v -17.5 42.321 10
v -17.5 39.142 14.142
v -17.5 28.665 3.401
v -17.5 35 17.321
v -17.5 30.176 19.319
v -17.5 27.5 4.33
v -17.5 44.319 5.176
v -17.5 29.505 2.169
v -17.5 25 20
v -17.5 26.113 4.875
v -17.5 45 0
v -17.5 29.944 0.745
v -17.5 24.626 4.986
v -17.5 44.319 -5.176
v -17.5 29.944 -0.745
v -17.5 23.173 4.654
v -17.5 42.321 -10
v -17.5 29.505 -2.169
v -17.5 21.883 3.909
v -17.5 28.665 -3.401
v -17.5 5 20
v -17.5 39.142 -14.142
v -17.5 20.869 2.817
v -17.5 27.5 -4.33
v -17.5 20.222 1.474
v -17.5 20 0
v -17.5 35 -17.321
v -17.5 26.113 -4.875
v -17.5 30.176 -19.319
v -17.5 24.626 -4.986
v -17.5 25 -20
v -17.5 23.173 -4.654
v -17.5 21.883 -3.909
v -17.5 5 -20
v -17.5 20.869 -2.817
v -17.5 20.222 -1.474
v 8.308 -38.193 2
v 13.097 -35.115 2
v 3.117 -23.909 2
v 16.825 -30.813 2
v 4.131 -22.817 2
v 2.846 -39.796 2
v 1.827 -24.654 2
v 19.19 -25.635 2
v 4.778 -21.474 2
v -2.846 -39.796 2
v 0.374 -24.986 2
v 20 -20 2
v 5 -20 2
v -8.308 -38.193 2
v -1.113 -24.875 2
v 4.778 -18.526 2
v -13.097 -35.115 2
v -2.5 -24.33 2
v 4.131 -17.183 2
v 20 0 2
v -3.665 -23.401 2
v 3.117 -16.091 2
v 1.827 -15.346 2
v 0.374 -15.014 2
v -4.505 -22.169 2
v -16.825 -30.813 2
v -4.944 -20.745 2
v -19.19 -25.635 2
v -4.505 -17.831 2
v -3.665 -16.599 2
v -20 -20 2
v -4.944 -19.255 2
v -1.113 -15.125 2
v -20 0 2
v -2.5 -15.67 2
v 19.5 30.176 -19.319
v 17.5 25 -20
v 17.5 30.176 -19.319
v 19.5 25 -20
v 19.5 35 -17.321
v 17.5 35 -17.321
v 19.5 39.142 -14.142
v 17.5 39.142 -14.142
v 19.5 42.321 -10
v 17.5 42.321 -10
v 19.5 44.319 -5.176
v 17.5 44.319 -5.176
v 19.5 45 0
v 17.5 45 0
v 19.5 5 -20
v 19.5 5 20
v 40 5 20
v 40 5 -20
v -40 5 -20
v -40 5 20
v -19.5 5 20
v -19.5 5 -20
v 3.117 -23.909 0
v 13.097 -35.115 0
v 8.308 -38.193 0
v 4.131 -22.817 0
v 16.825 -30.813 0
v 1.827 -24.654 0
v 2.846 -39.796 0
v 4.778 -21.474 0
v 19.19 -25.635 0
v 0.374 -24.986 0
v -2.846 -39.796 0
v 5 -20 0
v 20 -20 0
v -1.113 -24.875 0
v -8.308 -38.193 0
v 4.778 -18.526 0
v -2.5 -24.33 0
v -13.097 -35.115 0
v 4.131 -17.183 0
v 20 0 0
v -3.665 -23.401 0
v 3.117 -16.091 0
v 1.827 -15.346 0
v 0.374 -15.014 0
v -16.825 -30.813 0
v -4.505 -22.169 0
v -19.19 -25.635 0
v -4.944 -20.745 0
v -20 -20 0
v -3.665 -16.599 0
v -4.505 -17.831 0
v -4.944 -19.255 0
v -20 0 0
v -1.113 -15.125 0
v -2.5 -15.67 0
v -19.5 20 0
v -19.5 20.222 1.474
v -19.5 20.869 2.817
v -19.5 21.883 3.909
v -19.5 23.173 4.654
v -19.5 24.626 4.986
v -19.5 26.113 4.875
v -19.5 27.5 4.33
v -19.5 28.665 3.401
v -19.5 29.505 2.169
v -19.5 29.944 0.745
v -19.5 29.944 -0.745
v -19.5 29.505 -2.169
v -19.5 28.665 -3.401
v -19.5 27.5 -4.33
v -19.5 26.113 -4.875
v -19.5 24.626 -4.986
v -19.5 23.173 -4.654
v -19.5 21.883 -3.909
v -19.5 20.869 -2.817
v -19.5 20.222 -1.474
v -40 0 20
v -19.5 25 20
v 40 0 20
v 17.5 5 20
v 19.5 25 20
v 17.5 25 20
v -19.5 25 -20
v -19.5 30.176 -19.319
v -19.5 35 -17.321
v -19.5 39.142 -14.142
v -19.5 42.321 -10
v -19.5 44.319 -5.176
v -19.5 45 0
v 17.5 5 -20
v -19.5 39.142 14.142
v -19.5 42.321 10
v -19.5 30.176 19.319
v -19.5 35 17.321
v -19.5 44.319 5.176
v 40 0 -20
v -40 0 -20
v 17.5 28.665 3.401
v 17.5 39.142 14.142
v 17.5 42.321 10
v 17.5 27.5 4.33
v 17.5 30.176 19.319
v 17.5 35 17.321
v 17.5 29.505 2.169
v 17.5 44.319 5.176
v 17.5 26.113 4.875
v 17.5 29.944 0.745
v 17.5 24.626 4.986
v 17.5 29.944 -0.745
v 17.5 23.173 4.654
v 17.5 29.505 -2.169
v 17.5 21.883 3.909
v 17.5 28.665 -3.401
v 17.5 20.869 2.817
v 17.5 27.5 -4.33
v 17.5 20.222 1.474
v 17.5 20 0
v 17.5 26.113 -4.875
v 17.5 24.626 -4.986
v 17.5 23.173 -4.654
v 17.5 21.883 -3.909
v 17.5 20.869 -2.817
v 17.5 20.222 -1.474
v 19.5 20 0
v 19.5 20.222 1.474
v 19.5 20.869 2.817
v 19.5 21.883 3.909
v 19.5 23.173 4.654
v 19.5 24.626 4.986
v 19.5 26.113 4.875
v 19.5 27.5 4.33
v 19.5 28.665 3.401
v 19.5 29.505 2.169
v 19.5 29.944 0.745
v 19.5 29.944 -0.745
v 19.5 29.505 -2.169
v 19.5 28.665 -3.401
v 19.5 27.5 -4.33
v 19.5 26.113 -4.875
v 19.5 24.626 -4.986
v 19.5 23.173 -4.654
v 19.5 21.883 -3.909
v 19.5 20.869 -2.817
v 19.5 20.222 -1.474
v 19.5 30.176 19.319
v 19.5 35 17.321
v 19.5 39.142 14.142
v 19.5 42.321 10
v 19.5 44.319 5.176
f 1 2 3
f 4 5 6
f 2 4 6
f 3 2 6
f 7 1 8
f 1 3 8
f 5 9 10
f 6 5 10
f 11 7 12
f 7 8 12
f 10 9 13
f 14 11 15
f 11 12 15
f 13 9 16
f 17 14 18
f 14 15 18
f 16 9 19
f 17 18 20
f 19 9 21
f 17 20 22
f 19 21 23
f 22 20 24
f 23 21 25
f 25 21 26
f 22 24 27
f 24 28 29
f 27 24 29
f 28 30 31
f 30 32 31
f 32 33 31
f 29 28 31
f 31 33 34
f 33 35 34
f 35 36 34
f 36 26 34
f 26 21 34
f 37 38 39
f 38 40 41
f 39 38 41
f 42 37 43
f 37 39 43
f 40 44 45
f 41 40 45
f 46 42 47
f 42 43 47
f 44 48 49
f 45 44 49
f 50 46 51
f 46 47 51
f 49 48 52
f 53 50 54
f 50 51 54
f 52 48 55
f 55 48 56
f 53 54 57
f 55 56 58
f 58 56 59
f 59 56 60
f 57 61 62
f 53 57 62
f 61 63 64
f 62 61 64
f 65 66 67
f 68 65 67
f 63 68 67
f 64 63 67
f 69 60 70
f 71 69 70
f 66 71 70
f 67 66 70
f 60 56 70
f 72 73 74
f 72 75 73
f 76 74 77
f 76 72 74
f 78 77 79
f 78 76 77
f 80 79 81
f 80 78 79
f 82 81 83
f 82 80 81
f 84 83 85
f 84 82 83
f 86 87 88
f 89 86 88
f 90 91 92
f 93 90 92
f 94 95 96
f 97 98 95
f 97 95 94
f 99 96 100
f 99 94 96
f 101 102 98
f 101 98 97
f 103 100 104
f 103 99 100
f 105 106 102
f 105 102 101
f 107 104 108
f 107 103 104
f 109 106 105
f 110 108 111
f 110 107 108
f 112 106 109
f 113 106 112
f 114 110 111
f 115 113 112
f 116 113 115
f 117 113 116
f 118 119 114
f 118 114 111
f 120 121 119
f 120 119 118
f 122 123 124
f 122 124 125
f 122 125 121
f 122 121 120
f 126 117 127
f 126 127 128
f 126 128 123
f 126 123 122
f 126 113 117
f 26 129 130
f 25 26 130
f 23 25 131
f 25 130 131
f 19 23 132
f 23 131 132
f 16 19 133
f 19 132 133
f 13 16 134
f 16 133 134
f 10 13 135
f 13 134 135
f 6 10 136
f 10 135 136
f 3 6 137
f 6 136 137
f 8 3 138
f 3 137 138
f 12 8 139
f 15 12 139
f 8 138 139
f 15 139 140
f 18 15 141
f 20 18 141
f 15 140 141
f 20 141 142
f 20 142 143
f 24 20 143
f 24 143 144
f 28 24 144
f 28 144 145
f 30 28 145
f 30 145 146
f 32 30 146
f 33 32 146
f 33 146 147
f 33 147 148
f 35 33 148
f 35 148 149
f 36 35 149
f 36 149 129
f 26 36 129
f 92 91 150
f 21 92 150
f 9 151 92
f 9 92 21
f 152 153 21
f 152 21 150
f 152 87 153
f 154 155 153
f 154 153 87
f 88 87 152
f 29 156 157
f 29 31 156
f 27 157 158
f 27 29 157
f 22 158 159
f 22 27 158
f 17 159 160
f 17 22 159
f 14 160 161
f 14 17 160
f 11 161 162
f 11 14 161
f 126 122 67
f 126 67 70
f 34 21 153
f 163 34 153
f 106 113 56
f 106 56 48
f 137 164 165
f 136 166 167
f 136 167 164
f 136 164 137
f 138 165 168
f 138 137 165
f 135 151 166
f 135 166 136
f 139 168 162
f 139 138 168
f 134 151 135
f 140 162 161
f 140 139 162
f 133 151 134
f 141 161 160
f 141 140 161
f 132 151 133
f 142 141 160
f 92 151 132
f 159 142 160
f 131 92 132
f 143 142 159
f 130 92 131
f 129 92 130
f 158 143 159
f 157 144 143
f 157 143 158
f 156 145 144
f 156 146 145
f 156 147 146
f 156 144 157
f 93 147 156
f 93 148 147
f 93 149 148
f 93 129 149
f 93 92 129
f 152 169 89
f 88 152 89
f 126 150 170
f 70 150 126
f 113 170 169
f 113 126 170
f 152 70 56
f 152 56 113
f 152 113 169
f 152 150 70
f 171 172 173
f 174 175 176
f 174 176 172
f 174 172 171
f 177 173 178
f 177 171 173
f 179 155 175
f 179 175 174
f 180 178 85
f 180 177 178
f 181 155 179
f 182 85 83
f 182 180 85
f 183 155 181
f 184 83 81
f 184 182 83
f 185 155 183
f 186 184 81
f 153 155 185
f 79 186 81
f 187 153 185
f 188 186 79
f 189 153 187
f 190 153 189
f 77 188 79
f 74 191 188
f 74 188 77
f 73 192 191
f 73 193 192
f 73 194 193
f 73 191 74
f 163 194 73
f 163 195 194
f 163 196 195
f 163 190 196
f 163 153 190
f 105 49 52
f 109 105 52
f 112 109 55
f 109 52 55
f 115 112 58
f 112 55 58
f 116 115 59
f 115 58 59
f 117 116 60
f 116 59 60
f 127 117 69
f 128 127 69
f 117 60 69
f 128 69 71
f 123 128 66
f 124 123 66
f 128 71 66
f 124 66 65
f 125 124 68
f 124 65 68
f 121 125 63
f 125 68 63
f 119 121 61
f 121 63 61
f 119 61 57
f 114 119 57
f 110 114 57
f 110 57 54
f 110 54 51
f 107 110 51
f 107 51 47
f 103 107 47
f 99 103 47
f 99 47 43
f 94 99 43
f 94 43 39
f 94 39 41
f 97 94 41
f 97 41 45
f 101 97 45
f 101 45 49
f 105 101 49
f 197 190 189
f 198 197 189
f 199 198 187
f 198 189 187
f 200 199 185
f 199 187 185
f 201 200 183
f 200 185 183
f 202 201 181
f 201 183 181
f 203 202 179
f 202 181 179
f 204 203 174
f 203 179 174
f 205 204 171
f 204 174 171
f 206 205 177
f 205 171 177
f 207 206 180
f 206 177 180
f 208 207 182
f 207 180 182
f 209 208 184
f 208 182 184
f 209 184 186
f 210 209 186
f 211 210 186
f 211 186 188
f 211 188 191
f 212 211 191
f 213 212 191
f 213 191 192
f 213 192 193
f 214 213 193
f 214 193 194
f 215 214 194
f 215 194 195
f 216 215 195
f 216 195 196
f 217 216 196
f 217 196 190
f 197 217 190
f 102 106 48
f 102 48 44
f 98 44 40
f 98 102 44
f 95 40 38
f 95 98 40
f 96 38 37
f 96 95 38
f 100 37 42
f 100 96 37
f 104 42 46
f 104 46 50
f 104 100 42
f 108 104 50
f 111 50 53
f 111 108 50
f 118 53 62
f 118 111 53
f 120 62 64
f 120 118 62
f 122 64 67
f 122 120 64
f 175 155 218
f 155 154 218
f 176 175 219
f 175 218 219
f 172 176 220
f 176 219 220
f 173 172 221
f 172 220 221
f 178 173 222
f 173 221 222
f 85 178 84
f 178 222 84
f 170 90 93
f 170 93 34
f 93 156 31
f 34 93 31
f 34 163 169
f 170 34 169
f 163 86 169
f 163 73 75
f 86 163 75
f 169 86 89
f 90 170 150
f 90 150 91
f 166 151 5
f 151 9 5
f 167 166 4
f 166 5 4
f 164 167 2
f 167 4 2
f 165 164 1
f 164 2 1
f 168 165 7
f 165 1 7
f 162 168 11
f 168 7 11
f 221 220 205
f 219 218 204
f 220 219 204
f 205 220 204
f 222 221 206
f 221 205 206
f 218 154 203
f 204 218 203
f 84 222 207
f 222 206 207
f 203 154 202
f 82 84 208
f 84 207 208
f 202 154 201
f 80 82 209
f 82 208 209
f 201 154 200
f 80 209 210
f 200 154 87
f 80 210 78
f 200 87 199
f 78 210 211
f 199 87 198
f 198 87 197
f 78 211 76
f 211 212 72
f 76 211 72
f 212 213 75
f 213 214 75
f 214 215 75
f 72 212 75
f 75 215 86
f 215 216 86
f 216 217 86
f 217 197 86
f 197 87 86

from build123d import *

# Parameters (mm, degrees)
BOSS_EXTRUDE1_DEPTH = 2
SKETCH4_W           = 80
SKETCH4_H           = 5
BOSS_EXTRUDE2_DEPTH = 20
SKETCH5_W           = 2
SKETCH5_H           = 40
BOSS_EXTRUDE3_DEPTH = 40
FILLET1_R           = 20
SKETCH6_R           = 5
CUT_EXTRUDE1_DEPTH  = 80
SKETCH7_R           = 5
CUT_EXTRUDE2_DEPTH  = 80


with BuildPart() as part:
    # Sketch3 → Boss-Extrude1 (new body)
    with BuildSketch(Plane.XY):
        with BuildLine():
            Line((-20, 0), (20, 0))
            Line((20, 0), (20, -20))
            ThreePointArc((20, -20), (0, -40), (-20, -20))
            Line((-20, -20), (-20, 0))
        make_face()
    extrude(amount=BOSS_EXTRUDE1_DEPTH)

    # Sketch4 → Boss-Extrude2 (add, symmetric)
    with BuildSketch(Plane.XY):
        with Locations((0, 2.5)):
            Rectangle(SKETCH4_W, SKETCH4_H)
    extrude(amount=BOSS_EXTRUDE2_DEPTH, both=True)

    # Sketch5 → Boss-Extrude3 (add)
    with BuildSketch(Plane(origin=(0, 5, 0), x_dir=(1, 0, 0), z_dir=(0, 1, 0))):
        with Locations((-18.5, 0)):
            Rectangle(SKETCH5_W, SKETCH5_H)
        with Locations((18.5, 0)):
            Rectangle(SKETCH5_W, SKETCH5_H)
    extrude(amount=BOSS_EXTRUDE3_DEPTH)

    # Fillet1
    fillet1_edges = [part.edges().sort_by_distance(p)[0] for p in [
        (-18.5, 45, -20),
        (18.5, 45, -20),
        (-18.5, 45, 20),
        (18.5, 45, 20),
    ]]
    fillet(fillet1_edges, radius=FILLET1_R - 0.0001)  # a hair under: the kernel refuses the full size

    # Sketch6 → Cut-Extrude1 (cut)
    with BuildSketch(Plane.ZY.offset(19.5)):
        with Locations(Location((0, 25, 0), (0, 0, 270))):
            Circle(SKETCH6_R)
    extrude(amount=-CUT_EXTRUDE1_DEPTH, mode=Mode.SUBTRACT)

    # Sketch7 → Cut-Extrude2 (cut)
    with BuildSketch(Plane.XY.offset(2)):
        with Locations((0, -20)):
            Circle(SKETCH7_R)
    extrude(amount=-CUT_EXTRUDE2_DEPTH, mode=Mode.SUBTRACT)


solid = part.part
